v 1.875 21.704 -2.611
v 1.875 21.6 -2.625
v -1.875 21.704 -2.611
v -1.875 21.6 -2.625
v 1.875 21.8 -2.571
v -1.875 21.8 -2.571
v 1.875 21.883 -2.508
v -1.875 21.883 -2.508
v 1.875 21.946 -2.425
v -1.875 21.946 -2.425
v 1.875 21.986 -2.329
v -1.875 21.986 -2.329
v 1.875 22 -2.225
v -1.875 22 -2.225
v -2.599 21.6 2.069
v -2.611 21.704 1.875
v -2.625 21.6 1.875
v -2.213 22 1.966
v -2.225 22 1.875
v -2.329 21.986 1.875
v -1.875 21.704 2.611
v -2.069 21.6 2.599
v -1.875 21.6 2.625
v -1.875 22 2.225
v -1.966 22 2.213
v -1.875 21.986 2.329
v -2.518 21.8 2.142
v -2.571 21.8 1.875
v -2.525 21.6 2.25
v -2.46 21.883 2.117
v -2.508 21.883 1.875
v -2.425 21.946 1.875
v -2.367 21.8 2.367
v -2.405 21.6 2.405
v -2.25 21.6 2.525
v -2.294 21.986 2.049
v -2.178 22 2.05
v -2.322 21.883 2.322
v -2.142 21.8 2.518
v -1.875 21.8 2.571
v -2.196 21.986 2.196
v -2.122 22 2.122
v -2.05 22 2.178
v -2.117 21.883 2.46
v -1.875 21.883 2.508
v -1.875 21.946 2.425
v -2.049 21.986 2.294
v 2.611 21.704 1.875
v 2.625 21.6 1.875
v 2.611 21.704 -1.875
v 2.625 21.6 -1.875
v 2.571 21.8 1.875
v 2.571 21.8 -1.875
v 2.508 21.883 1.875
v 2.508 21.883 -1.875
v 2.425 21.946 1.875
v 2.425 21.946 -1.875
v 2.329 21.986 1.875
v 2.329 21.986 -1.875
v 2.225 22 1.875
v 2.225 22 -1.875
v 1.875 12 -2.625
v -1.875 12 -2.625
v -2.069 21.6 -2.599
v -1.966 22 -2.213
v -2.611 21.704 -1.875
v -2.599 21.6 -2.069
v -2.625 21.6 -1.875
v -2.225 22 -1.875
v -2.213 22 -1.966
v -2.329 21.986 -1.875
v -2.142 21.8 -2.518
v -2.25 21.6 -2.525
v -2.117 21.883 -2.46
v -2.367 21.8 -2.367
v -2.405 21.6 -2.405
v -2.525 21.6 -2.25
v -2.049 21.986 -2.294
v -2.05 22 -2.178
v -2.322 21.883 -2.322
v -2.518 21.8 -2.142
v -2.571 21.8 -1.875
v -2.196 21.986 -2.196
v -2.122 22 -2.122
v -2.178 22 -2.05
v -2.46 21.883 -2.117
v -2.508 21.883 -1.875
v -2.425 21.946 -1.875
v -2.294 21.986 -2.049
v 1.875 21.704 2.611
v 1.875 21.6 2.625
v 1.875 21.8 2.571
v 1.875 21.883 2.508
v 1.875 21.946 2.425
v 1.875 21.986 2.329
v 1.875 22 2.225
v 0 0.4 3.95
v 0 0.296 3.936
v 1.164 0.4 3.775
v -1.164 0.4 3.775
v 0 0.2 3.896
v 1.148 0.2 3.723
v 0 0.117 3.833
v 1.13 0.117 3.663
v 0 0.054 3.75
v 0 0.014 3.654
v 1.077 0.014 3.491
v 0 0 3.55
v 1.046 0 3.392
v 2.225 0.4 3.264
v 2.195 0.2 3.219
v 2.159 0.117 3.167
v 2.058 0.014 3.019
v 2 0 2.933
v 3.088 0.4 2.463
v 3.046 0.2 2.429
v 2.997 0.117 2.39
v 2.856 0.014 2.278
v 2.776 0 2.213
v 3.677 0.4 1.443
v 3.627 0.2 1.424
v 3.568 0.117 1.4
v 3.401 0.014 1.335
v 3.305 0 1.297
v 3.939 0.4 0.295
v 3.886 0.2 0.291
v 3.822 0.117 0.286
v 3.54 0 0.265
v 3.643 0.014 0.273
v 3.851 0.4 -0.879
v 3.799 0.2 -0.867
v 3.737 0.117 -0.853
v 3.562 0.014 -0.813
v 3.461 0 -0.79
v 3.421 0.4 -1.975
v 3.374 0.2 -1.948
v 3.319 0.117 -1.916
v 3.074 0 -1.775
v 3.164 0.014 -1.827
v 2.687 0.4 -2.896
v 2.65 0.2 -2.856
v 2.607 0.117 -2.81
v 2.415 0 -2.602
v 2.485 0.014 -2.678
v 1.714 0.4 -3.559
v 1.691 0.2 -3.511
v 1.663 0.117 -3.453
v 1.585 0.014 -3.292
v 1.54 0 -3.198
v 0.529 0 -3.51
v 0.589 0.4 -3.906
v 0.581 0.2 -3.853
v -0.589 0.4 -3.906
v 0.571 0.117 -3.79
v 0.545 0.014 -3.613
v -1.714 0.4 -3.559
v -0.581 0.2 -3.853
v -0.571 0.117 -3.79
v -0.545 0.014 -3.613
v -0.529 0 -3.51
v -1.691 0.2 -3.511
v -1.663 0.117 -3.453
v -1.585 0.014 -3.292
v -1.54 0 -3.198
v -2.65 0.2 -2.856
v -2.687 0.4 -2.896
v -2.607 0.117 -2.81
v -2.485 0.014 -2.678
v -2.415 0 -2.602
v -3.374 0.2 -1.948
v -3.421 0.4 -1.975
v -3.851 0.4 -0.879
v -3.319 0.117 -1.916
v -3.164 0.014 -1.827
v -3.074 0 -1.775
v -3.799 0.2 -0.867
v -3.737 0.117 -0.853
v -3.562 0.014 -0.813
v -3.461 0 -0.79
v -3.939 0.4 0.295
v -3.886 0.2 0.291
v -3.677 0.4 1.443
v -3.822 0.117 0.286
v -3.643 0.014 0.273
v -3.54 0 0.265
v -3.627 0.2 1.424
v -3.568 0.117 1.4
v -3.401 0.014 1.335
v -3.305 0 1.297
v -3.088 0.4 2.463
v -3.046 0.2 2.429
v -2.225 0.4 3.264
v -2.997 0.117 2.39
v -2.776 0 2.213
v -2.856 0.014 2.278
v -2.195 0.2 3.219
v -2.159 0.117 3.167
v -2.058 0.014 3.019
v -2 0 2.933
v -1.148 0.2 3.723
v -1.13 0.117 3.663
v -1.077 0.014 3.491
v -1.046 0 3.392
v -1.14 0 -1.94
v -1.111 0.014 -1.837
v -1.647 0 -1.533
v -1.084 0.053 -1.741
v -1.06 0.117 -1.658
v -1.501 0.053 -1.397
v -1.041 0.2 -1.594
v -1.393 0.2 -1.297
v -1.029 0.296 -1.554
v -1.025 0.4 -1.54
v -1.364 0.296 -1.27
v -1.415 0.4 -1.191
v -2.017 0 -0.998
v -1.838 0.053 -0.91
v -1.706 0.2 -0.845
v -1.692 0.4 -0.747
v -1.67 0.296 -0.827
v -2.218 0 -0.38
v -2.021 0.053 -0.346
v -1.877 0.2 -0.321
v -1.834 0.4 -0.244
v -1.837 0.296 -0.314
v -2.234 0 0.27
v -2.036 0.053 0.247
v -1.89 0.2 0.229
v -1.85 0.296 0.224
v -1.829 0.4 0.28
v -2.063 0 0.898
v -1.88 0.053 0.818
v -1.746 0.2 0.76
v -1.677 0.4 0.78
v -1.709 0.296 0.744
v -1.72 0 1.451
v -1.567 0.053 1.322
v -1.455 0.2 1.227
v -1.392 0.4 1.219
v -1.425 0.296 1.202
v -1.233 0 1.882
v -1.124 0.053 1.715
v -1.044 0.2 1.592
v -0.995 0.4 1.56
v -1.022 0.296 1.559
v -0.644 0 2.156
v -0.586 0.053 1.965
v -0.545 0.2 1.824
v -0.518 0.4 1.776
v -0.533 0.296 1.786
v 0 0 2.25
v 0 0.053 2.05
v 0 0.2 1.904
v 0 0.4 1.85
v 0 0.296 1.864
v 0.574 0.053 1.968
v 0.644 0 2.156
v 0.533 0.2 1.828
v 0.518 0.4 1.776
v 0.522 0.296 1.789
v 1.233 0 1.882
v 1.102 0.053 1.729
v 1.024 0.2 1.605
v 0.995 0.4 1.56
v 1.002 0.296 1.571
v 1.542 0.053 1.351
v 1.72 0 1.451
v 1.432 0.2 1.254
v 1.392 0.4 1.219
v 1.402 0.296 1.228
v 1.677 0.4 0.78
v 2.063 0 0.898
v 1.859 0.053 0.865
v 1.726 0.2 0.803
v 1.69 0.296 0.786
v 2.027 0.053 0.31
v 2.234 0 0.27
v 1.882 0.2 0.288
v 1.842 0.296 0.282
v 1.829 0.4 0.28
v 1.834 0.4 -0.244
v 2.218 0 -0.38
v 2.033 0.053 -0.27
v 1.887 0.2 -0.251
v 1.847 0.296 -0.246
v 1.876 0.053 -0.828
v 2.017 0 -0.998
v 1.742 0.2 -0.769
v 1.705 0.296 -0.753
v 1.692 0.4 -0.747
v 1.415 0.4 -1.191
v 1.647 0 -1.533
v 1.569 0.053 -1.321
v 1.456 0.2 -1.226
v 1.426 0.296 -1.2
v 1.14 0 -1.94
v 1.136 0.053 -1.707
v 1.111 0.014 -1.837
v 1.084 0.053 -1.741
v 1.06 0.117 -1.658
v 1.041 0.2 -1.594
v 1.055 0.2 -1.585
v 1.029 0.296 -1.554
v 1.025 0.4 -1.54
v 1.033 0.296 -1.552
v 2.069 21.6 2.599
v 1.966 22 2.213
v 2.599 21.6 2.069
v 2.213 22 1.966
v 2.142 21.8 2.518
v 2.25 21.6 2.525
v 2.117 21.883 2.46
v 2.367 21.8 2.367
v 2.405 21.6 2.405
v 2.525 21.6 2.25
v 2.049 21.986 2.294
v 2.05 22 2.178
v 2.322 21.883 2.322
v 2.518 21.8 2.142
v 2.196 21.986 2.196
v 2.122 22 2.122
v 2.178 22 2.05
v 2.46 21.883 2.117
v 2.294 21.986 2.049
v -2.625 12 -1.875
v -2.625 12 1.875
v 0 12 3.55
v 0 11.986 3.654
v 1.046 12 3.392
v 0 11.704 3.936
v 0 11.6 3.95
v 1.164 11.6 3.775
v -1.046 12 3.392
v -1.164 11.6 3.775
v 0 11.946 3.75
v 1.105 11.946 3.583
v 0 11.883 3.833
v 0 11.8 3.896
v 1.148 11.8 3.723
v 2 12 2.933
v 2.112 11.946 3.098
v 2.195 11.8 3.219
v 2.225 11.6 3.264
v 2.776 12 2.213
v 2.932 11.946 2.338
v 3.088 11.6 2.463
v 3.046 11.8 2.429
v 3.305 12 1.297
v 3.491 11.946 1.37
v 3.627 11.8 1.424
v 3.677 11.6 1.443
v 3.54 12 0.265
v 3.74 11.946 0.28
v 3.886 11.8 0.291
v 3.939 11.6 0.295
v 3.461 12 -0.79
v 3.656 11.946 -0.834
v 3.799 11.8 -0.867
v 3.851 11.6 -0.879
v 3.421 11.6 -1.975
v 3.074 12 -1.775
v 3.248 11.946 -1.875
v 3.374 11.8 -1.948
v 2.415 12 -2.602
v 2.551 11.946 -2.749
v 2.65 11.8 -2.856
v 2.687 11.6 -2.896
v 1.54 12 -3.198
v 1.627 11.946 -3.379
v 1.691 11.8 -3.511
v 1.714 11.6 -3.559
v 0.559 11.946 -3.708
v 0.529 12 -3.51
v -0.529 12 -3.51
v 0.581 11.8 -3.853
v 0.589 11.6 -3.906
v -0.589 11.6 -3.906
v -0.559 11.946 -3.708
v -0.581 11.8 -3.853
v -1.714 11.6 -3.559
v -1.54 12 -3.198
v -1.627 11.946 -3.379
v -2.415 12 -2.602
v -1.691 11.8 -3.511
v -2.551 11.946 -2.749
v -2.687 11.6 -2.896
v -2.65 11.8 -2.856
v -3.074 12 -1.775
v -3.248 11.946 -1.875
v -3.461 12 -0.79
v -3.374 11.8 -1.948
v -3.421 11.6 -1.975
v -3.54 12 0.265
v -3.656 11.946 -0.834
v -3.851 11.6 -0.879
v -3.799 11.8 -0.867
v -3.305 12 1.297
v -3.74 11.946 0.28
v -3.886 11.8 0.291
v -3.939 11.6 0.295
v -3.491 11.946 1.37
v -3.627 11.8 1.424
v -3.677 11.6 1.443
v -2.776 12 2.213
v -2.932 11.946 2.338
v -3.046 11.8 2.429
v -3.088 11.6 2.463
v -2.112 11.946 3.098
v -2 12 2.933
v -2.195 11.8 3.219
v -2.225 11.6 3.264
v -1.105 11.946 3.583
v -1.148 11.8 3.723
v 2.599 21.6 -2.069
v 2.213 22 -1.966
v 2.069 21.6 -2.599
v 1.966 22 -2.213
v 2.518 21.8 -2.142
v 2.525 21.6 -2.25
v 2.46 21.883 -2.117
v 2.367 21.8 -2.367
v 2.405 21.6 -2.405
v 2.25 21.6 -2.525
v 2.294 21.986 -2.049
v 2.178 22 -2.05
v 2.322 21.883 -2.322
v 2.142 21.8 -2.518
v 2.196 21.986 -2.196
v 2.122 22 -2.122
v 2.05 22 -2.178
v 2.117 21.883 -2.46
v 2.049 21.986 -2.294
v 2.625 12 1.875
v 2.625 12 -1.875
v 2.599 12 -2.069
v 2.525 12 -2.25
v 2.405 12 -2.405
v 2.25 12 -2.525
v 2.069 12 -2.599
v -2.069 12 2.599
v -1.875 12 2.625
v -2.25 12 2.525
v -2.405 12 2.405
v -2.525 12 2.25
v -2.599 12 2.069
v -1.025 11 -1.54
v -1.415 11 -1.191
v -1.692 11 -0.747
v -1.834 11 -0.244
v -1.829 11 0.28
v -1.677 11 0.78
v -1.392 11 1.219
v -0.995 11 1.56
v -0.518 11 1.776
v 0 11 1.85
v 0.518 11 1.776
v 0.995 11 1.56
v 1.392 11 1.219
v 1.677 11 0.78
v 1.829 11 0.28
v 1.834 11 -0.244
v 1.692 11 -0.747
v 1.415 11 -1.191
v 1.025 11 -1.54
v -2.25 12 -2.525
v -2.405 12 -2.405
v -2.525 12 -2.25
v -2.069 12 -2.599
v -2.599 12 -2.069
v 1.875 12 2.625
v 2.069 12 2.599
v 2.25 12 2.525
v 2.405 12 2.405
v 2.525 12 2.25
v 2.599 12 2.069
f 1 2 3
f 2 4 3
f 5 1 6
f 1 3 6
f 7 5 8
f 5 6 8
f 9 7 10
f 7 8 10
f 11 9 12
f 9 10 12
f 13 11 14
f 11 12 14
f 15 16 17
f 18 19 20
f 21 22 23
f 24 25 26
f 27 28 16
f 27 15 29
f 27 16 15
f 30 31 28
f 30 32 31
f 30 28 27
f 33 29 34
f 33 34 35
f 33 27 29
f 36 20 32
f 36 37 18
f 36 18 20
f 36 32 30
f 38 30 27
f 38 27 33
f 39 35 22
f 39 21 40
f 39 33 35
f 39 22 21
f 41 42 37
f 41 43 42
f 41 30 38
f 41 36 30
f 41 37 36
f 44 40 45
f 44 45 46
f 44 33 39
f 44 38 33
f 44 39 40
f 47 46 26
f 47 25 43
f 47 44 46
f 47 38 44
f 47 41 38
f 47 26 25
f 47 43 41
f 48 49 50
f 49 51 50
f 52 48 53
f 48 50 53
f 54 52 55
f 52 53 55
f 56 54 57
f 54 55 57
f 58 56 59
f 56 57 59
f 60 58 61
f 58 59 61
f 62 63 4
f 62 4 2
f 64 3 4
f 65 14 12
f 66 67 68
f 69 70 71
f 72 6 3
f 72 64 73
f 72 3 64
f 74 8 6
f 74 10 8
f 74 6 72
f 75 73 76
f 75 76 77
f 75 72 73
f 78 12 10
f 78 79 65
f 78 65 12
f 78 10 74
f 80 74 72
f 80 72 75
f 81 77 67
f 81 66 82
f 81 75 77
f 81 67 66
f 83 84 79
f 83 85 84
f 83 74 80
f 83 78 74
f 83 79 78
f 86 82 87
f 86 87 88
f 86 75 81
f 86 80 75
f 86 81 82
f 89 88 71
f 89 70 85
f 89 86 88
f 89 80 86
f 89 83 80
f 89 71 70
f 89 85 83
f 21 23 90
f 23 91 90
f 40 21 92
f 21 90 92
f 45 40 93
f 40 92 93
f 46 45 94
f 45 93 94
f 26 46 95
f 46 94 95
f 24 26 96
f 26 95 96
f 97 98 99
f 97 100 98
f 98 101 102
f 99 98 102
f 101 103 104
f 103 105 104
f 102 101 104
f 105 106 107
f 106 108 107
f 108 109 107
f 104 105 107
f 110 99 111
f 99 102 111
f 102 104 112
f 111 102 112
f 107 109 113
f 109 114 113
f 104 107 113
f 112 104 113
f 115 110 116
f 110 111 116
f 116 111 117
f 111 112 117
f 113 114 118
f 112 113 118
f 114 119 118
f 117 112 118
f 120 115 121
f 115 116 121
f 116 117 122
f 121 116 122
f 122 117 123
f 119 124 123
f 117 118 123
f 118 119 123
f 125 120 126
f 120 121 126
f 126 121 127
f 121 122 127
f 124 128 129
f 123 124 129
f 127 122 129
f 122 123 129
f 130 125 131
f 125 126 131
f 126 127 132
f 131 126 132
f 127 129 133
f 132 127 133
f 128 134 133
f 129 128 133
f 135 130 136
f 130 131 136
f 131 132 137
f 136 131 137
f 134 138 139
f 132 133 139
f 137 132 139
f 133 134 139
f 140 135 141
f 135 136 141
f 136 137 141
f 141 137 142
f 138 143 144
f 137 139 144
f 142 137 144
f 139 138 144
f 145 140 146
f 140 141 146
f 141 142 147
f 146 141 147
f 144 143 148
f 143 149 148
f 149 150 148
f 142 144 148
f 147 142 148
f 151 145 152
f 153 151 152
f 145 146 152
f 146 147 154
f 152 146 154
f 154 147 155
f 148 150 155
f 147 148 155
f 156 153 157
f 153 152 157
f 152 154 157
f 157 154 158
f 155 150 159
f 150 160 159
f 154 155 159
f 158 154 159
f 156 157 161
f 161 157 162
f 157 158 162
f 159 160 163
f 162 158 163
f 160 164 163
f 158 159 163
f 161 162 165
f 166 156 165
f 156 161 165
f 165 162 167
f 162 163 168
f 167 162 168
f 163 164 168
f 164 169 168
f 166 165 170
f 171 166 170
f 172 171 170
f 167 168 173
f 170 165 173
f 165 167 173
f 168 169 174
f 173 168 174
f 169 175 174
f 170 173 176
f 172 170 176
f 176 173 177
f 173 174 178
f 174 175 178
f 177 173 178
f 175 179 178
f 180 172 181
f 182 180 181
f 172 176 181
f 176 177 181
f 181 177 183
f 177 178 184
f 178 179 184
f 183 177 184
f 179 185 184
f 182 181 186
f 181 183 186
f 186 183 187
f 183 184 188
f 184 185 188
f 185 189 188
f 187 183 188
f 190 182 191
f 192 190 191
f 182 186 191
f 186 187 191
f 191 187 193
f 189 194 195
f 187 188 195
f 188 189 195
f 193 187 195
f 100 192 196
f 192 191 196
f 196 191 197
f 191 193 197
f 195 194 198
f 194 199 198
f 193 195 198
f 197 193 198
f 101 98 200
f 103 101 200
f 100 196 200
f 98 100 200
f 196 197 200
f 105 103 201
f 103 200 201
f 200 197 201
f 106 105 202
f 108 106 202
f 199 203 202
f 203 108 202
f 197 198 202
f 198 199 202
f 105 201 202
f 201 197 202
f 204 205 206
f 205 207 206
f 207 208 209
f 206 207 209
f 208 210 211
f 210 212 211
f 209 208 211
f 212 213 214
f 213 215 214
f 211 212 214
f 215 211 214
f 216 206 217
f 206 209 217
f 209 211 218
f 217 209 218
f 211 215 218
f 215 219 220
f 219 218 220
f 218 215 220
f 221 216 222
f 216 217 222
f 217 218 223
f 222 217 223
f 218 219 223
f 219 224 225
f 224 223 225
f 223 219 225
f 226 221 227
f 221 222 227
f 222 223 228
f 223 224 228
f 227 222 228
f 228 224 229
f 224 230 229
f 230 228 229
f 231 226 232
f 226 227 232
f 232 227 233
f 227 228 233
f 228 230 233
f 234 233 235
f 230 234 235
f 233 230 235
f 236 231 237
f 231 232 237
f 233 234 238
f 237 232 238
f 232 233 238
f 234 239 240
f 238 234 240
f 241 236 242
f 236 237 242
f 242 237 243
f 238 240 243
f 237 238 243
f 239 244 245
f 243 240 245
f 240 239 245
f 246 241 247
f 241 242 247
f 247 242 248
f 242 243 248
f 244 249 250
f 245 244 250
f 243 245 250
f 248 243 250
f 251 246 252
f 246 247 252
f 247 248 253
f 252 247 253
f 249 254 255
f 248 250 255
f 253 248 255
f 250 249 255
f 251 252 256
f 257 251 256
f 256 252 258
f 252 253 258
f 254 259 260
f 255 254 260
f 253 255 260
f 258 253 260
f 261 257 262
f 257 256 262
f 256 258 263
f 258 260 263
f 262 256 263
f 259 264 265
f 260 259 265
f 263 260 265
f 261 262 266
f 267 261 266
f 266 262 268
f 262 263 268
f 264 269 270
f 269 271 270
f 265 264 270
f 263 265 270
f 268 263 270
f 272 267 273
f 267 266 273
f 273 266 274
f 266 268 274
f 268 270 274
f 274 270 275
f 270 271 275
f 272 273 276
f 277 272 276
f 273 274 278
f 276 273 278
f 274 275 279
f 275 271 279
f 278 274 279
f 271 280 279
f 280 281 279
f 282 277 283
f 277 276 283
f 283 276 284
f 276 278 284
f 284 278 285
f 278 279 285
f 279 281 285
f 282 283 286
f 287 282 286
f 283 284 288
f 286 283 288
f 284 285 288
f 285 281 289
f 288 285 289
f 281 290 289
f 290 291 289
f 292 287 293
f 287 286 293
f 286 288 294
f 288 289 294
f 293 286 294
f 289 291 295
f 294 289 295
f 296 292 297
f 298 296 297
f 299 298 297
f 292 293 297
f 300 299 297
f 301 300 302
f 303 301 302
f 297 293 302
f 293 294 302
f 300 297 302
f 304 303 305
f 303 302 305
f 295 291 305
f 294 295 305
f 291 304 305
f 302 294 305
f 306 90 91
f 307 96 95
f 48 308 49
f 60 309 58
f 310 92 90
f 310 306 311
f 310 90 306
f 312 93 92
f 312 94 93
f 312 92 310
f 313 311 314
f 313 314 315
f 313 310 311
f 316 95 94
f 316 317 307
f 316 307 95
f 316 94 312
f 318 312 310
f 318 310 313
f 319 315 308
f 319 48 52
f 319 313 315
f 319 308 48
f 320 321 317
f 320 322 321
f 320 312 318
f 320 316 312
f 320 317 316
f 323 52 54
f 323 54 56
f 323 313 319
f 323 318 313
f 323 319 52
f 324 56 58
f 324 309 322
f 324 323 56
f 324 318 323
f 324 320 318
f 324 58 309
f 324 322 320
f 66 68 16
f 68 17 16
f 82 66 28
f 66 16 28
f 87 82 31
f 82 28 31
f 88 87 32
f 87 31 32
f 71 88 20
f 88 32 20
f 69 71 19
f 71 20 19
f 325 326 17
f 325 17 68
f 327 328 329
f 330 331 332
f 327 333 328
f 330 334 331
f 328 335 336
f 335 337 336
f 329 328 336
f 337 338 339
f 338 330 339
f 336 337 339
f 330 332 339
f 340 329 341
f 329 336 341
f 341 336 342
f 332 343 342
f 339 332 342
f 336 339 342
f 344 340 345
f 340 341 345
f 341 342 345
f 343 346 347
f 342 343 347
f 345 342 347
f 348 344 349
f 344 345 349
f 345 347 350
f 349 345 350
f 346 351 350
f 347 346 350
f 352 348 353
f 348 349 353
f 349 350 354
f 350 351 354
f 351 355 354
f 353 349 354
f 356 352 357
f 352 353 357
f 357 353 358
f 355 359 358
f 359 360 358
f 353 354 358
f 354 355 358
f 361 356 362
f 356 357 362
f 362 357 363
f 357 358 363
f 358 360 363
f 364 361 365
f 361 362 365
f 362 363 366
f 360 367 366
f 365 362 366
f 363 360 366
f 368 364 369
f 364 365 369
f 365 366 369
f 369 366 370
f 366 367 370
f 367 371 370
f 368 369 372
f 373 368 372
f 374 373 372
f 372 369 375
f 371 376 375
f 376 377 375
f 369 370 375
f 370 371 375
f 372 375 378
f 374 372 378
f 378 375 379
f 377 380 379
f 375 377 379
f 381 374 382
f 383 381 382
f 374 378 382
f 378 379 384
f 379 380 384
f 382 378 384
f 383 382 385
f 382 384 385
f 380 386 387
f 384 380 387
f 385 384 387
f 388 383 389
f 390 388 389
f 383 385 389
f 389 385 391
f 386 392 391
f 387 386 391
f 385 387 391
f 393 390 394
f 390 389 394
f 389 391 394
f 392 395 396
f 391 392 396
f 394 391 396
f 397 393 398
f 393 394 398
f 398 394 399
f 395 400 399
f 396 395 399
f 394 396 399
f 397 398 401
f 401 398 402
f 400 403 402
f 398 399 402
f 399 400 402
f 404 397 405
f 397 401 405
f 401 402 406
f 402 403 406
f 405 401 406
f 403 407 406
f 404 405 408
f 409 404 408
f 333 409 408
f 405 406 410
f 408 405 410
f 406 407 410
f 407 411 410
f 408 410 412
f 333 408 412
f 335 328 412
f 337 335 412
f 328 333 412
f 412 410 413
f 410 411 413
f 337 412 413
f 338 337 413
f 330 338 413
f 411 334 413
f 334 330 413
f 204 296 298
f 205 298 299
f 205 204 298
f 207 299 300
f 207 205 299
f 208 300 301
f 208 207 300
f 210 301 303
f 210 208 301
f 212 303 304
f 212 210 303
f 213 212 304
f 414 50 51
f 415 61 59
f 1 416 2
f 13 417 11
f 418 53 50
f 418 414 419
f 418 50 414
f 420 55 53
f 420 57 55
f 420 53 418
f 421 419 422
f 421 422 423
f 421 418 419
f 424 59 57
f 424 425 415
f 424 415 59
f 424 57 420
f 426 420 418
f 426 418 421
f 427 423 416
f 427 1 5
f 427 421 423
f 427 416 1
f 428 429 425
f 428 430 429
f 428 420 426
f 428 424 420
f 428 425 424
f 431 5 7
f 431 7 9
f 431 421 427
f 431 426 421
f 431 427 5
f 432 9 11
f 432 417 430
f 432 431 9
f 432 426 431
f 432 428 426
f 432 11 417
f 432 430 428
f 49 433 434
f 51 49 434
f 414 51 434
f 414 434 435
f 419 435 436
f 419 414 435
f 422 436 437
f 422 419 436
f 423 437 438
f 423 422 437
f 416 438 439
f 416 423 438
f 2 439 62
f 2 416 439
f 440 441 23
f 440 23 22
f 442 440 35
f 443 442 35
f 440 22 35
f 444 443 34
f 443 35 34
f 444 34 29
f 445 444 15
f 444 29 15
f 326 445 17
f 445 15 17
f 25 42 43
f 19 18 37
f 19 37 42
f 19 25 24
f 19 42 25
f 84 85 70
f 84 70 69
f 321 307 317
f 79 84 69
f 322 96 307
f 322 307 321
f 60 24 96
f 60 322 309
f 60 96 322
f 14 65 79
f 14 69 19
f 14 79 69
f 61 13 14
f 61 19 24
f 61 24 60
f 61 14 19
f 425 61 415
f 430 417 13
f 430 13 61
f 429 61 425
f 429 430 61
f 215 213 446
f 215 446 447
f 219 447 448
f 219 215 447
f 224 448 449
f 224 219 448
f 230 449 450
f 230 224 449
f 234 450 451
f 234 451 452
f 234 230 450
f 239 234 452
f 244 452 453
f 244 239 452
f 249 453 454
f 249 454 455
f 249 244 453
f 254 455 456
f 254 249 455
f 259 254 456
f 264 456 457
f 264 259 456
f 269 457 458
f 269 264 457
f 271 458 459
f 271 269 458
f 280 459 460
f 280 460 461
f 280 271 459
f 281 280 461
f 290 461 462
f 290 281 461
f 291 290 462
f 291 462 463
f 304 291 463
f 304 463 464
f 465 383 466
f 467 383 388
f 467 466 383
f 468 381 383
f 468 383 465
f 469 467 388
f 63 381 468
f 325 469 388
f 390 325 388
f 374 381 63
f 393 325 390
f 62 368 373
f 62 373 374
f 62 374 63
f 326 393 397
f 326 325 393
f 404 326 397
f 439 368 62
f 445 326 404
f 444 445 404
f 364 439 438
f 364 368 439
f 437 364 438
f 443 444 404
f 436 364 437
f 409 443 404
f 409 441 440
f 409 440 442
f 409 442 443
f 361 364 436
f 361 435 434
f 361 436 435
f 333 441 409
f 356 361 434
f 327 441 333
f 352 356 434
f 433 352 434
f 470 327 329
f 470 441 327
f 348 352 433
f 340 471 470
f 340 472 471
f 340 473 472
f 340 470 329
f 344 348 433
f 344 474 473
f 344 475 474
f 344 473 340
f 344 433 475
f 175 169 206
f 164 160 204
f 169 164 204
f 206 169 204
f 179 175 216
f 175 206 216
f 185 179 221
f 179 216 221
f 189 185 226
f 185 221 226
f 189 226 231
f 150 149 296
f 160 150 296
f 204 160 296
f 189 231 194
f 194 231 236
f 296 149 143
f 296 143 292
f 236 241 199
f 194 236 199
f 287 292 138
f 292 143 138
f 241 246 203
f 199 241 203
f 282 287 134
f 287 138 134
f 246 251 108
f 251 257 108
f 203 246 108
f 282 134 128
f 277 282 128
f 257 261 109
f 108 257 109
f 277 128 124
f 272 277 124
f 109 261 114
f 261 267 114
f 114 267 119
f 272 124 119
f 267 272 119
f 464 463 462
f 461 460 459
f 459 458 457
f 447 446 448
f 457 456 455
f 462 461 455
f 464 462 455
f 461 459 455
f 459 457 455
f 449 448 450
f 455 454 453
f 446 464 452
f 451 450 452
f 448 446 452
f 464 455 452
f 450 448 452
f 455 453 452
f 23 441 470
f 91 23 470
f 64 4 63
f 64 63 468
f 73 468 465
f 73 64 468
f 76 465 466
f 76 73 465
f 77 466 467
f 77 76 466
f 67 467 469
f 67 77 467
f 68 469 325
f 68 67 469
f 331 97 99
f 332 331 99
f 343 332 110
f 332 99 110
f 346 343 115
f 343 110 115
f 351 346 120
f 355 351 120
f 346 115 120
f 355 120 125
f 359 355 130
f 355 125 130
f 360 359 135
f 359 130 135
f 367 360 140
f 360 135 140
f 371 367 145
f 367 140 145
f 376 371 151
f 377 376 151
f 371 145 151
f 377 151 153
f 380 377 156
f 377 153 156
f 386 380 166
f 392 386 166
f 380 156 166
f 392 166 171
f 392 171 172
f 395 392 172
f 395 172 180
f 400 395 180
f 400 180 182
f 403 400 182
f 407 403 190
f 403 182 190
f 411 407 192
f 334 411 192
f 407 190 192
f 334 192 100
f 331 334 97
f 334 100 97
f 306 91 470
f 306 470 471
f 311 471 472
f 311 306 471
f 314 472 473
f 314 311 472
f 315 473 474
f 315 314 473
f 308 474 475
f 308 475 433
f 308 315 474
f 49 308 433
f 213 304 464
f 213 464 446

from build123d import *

# Parameters (mm, degrees)
SKETCH1_R           = 3.95
BOSS_EXTRUDE1_DEPTH = 12
SKETCH2_W           = 5.25
SKETCH2_H           = 5.25
BOSS_EXTRUDE2_DEPTH = 10
CUT_EXTRUDE1_DEPTH  = 11
FILLET1_R           = 0.75
FILLET2_R           = 0.4


with BuildPart() as part:
    # Sketch1 → Boss-Extrude1 (new body)
    with BuildSketch(Plane(origin=(0, 0, 0), x_dir=(1, 0, 0), z_dir=(0, 1, 0))):
        with Locations(Location((0, 0, 0), (0, 0, 270))):
            Circle(SKETCH1_R)
    extrude(amount=BOSS_EXTRUDE1_DEPTH)

    # Sketch2 → Boss-Extrude2 (add)
    with BuildSketch(Plane(origin=(0, 12, 0), x_dir=(1, 0, 0), z_dir=(0, 1, 0))):
        Rectangle(SKETCH2_W, SKETCH2_H)
    extrude(amount=BOSS_EXTRUDE2_DEPTH)

    # Sketch3 → Cut-Extrude1 (cut)
    with BuildSketch(Plane.XZ):
        with BuildLine():
            Line((1.025, -1.540089283), (-1.025, -1.540089283))
            ThreePointArc((-1.025, -1.540089283), (0, 1.85), (1.025, -1.540089283))
        make_face()
    extrude(amount=-CUT_EXTRUDE1_DEPTH, mode=Mode.SUBTRACT)

    # Fillet1
    fillet1_edges = [part.edges().sort_by_distance(p)[0] for p in [
        (-2.625, 17, -2.625),
        (-2.625, 17, 2.625),
        (2.625, 17, 2.625),
        (2.625, 17, -2.625),
    ]]
    fillet(fillet1_edges, radius=FILLET1_R)

    # Fillet2
    fillet2_edges = [part.edges().sort_by_distance(p)[0] for p in [
        (0, 0, 1.85),
        (0, 0, -1.540089283),
        (0, 0, -3.95),
        (2.625, 22, 0),
        (0, 22, 2.625),
        (-2.625, 22, 0),
        (0, 22, -2.625),
        (-2.405330086, 22, 2.405330086),
        (-2.405330086, 22, -2.405330086),
        (2.405330086, 22, -2.405330086),
        (2.405330086, 22, 2.405330086),
        (0, 12, -3.95),
    ]]
    fillet(fillet2_edges, radius=FILLET2_R)


solid = part.part
